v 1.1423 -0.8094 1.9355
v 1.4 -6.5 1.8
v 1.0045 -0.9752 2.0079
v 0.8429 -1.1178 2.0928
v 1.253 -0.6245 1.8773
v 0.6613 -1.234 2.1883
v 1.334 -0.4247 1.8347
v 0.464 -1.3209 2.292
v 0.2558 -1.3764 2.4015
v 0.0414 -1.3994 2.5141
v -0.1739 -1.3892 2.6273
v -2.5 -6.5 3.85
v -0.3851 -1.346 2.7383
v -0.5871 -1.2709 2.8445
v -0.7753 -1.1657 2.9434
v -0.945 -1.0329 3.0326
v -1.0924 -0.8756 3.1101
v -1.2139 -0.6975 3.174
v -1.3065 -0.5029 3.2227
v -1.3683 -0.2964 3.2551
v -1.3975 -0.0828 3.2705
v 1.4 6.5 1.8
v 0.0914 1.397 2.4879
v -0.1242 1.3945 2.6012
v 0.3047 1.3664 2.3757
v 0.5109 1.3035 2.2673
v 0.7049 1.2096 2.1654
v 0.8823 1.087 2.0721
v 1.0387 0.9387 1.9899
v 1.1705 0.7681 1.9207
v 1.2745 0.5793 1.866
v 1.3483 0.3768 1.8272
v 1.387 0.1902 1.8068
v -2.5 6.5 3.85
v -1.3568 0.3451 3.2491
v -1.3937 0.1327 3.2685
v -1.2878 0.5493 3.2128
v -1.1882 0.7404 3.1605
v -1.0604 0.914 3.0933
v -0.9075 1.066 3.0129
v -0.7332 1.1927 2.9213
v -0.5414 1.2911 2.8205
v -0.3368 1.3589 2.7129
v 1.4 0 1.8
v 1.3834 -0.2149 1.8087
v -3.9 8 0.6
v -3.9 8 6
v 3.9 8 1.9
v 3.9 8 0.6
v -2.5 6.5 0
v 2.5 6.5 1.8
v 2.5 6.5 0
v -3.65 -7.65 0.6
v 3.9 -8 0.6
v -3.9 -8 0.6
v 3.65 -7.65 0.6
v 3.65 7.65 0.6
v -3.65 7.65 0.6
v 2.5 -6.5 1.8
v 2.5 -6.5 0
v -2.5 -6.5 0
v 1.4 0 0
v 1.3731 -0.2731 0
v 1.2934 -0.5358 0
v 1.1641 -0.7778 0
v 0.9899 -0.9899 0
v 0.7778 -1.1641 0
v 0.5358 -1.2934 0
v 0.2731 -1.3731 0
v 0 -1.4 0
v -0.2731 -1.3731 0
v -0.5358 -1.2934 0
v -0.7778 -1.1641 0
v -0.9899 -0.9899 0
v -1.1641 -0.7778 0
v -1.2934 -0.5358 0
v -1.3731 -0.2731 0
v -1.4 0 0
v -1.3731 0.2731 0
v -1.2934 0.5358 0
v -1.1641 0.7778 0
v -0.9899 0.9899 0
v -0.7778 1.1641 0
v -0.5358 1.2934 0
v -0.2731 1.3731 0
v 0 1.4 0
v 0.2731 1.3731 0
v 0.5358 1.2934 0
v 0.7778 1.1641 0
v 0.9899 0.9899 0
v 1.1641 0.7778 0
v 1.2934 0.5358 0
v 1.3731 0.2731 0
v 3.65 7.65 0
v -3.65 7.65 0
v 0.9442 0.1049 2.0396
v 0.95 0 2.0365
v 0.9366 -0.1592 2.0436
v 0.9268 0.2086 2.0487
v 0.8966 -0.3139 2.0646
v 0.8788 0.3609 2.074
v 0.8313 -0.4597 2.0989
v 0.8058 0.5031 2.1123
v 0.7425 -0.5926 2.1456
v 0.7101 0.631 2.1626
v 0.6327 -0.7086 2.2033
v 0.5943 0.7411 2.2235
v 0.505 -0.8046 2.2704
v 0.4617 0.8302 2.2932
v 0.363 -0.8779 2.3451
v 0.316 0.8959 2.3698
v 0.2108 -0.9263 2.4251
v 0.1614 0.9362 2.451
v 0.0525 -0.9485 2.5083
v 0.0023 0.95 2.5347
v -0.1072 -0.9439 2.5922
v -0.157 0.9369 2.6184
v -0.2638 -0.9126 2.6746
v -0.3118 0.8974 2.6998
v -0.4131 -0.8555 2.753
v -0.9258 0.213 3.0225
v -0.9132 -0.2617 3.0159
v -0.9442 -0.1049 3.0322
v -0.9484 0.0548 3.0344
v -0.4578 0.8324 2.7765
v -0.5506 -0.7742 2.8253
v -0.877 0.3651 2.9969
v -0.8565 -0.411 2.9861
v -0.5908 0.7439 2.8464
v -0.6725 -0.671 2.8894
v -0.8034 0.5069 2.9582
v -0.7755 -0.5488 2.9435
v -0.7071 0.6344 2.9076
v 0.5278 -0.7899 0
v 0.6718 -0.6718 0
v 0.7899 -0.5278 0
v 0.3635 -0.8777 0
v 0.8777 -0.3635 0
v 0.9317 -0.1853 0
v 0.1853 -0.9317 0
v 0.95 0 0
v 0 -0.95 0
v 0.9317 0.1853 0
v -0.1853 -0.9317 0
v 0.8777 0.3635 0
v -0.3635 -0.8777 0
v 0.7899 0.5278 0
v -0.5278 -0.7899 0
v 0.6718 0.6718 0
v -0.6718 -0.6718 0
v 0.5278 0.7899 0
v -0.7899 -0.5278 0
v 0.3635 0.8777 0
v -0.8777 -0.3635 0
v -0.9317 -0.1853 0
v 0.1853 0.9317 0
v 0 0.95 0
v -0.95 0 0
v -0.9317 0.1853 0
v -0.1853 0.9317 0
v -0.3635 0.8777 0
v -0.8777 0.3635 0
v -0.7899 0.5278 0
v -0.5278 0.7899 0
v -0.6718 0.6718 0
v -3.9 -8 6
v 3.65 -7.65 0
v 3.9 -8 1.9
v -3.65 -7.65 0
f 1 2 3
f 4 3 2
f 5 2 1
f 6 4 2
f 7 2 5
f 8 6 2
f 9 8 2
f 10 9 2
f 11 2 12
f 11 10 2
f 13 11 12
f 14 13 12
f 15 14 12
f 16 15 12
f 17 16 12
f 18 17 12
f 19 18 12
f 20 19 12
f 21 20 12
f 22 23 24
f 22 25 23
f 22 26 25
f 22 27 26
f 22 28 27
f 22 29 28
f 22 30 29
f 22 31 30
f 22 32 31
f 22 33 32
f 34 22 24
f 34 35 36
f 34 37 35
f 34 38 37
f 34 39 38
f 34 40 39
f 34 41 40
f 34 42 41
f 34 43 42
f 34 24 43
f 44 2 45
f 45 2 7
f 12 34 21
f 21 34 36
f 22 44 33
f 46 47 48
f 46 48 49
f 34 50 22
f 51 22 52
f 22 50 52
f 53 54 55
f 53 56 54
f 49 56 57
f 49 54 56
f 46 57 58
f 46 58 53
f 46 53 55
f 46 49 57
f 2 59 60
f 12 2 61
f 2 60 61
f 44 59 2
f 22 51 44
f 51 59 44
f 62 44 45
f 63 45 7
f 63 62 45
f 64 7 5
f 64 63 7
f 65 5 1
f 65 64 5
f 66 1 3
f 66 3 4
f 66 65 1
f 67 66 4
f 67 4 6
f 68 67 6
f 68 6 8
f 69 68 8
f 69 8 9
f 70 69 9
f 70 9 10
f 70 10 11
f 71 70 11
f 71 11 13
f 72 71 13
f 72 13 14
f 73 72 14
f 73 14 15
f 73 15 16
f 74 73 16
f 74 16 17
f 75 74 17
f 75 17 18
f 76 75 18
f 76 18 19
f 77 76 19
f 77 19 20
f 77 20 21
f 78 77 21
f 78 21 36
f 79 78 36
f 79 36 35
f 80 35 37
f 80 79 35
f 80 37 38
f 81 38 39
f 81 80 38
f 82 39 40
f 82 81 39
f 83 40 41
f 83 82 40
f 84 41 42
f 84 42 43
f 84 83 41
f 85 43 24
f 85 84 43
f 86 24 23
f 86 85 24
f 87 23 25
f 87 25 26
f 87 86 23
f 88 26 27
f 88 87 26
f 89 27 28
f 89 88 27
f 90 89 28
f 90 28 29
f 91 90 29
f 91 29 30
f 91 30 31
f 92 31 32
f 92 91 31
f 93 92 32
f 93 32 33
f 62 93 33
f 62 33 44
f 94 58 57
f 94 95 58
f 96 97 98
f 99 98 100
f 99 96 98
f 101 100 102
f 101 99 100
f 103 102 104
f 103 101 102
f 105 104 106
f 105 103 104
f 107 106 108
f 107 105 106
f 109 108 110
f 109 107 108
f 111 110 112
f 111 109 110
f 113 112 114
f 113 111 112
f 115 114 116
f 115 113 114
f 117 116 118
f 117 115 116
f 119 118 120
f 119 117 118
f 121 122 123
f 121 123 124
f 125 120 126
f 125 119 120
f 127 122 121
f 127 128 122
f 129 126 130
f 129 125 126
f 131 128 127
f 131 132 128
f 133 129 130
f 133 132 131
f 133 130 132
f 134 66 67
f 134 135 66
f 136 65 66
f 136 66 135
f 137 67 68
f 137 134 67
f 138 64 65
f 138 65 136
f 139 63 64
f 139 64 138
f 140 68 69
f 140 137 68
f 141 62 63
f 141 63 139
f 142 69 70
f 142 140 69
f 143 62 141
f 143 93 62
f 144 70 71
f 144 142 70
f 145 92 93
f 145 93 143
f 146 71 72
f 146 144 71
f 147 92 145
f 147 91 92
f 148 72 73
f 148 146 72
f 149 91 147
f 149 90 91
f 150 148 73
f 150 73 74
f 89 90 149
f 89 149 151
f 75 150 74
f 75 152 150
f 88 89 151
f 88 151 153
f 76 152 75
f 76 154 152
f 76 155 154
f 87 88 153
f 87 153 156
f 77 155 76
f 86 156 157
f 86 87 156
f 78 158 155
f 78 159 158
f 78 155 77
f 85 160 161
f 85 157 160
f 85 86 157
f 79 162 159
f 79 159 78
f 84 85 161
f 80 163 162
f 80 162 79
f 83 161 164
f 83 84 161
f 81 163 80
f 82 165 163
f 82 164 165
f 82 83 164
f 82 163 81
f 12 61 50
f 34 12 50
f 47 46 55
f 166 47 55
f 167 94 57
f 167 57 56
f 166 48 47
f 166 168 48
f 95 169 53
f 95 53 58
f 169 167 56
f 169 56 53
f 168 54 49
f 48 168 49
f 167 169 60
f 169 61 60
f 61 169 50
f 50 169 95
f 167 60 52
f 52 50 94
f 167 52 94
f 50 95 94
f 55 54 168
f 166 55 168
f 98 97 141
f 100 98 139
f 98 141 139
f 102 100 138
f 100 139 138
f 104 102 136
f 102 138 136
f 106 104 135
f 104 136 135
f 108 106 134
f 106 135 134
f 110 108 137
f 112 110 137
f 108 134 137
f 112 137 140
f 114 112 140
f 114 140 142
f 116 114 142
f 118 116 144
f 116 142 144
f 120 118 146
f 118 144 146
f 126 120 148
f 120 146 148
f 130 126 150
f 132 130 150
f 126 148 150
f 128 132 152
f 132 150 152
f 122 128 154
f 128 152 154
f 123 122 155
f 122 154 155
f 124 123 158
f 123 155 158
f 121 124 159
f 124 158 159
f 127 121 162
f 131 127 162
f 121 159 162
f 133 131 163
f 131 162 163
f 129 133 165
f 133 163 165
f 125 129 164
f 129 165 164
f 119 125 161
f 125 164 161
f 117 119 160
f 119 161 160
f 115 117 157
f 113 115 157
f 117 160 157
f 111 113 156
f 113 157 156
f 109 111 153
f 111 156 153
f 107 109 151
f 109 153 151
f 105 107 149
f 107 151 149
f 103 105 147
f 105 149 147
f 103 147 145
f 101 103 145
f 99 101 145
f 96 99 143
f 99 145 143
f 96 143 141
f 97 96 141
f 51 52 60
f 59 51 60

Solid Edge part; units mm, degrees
sketch "Sketch1" plane through (0, 0, 0) normal (0, 0, 1) x (1, 0, 0)
  line L0 (3.9, 7.9) -> (-3.9, 7.9)
  line L1 (-3.9, 7.9) -> (-3.9, -7.9)
  line L2 (-3.9, -7.9) -> (3.9, -7.9)
  line L3 (3.9, -7.9) -> (3.9, 7.9)
extrude "Protrusion1" add sketch "Sketch1" along normal blind 6
sketch "Sketch2" plane through (0, -7.9, 3) normal (0, -1, 0) x (1, 0, 0)
  line L0 (3.9, -3) -> (3.9, -1.1)
  line L1 (3.9, -1.1) -> (-3.9, 3)
  line L2 (-3.9, 3) -> (-3.9, 3.5621)
  line L3 (-3.9, 3.5621) -> (6.8698, 3.4105)
  line L4 (6.8698, 3.4105) -> (3.9, -3)
extrude "ExtrudedCutout_1" cut sketch "Sketch2" against normal blind 28.4067
sketch "Sketch3" plane through (0, 0, 0) normal (0, 0, -1) x (1, 0, 0)
  line L0 (3.65, 7.65) -> (-3.65, 7.65)
  line L1 (-3.65, 7.65) -> (-3.65, -7.65)
  line L2 (-3.65, -7.65) -> (3.65, -7.65)
  line L3 (3.65, -7.65) -> (3.65, 7.65)
  line L4 (-4.59, -8.7889) -> (5.3032, -8.7889)
  line L5 (5.3032, -8.7889) -> (5.3032, 8.7889)
  line L6 (5.3032, 8.7889) -> (-4.59, 8.7889)
  line L7 (-4.59, 8.7889) -> (-4.59, -8.7889)
extrude "ExtrudedCutout_2" cut sketch "Sketch3" against normal blind 0.6
sketch "Sketch4" plane through (0, 0, 0) normal (0, 0, -1) x (1, 0, 0)
  line L0 (-2.5, -6.5) -> (2.5, -6.5)
  line L1 (2.5, -6.5) -> (2.5, 6.5)
  line L2 (2.5, 6.5) -> (-2.5, 6.5)
  line L3 (-2.5, 6.5) -> (-2.5, -6.5)
extrude "ExtrudedCutout_3" cut sketch "Sketch4" against normal blind 1.8
sketch "Sketch5" plane through (0, 6.5, 0.9) normal (0, -1, 0) x (1, 0, 0)
  line L0 (-2.5, 0.9) -> (-2.5, 2.95)
  line L1 (1.4, 0.9) -> (-2.5, 2.95)
  line L2 (-2.5, 0.9) -> (1.4, 0.9)
extrude "Cutout1" cut sketch "Sketch5" along normal up to vertex (13 mm away)
sketch "Sketch6" plane through (0, 0, 0) normal (0, 0, -1) x (1, 0, 0)
  circle A0 centre (0, 0) radius 1.4
  circle A1 centre (0, 0) radius 0.95
extrude "ExtrudedProtrusion_2" add sketch "Sketch6" against normal blind 6.3788
sketch "Sketch7" plane through (0, -7.9, 3.3) normal (0, -1, 0) x (1, 0, 0)
  line L0 (-3.9, 2.7) -> (3.9, -1.4)
  line L1 (3.9, -1.4) -> (3.4688, 3.9064)
  line L2 (3.4688, 3.9064) -> (-3.9, 2.7)
extrude "ExtrudedCutout_5" cut sketch "Sketch7" against normal blind 34.0923
sketch "Sketch8" plane through (0, -7.9, 3.3) normal (0, -1, 0) x (0, 0, 1)
  line L0 (-2.7, -3.9) -> (-2.7, 3.9)
  line L1 (-2.7, 3.9) -> (2.7, 3.9)
  line L2 (2.7, 3.9) -> (-1.4, -3.9)
  line L3 (-1.4, -3.9) -> (-2.7, -3.9)
extrude "ExtrudedProtrusion_3" add sketch "Sketch8" along normal blind 0.1
sketch "Sketch9" plane through (0, 7.9, 3.3) normal (0, 1, 0) x (0, 0, -1)
  line L0 (-2.7, 3.9) -> (2.7, 3.9)
  line L1 (2.7, 3.9) -> (2.7, -3.9)
  line L2 (2.7, -3.9) -> (1.4, -3.9)
  line L3 (1.4, -3.9) -> (-2.7, 3.9)
extrude "ExtrudedProtrusion_4" add sketch "Sketch9" along normal blind 0.1
